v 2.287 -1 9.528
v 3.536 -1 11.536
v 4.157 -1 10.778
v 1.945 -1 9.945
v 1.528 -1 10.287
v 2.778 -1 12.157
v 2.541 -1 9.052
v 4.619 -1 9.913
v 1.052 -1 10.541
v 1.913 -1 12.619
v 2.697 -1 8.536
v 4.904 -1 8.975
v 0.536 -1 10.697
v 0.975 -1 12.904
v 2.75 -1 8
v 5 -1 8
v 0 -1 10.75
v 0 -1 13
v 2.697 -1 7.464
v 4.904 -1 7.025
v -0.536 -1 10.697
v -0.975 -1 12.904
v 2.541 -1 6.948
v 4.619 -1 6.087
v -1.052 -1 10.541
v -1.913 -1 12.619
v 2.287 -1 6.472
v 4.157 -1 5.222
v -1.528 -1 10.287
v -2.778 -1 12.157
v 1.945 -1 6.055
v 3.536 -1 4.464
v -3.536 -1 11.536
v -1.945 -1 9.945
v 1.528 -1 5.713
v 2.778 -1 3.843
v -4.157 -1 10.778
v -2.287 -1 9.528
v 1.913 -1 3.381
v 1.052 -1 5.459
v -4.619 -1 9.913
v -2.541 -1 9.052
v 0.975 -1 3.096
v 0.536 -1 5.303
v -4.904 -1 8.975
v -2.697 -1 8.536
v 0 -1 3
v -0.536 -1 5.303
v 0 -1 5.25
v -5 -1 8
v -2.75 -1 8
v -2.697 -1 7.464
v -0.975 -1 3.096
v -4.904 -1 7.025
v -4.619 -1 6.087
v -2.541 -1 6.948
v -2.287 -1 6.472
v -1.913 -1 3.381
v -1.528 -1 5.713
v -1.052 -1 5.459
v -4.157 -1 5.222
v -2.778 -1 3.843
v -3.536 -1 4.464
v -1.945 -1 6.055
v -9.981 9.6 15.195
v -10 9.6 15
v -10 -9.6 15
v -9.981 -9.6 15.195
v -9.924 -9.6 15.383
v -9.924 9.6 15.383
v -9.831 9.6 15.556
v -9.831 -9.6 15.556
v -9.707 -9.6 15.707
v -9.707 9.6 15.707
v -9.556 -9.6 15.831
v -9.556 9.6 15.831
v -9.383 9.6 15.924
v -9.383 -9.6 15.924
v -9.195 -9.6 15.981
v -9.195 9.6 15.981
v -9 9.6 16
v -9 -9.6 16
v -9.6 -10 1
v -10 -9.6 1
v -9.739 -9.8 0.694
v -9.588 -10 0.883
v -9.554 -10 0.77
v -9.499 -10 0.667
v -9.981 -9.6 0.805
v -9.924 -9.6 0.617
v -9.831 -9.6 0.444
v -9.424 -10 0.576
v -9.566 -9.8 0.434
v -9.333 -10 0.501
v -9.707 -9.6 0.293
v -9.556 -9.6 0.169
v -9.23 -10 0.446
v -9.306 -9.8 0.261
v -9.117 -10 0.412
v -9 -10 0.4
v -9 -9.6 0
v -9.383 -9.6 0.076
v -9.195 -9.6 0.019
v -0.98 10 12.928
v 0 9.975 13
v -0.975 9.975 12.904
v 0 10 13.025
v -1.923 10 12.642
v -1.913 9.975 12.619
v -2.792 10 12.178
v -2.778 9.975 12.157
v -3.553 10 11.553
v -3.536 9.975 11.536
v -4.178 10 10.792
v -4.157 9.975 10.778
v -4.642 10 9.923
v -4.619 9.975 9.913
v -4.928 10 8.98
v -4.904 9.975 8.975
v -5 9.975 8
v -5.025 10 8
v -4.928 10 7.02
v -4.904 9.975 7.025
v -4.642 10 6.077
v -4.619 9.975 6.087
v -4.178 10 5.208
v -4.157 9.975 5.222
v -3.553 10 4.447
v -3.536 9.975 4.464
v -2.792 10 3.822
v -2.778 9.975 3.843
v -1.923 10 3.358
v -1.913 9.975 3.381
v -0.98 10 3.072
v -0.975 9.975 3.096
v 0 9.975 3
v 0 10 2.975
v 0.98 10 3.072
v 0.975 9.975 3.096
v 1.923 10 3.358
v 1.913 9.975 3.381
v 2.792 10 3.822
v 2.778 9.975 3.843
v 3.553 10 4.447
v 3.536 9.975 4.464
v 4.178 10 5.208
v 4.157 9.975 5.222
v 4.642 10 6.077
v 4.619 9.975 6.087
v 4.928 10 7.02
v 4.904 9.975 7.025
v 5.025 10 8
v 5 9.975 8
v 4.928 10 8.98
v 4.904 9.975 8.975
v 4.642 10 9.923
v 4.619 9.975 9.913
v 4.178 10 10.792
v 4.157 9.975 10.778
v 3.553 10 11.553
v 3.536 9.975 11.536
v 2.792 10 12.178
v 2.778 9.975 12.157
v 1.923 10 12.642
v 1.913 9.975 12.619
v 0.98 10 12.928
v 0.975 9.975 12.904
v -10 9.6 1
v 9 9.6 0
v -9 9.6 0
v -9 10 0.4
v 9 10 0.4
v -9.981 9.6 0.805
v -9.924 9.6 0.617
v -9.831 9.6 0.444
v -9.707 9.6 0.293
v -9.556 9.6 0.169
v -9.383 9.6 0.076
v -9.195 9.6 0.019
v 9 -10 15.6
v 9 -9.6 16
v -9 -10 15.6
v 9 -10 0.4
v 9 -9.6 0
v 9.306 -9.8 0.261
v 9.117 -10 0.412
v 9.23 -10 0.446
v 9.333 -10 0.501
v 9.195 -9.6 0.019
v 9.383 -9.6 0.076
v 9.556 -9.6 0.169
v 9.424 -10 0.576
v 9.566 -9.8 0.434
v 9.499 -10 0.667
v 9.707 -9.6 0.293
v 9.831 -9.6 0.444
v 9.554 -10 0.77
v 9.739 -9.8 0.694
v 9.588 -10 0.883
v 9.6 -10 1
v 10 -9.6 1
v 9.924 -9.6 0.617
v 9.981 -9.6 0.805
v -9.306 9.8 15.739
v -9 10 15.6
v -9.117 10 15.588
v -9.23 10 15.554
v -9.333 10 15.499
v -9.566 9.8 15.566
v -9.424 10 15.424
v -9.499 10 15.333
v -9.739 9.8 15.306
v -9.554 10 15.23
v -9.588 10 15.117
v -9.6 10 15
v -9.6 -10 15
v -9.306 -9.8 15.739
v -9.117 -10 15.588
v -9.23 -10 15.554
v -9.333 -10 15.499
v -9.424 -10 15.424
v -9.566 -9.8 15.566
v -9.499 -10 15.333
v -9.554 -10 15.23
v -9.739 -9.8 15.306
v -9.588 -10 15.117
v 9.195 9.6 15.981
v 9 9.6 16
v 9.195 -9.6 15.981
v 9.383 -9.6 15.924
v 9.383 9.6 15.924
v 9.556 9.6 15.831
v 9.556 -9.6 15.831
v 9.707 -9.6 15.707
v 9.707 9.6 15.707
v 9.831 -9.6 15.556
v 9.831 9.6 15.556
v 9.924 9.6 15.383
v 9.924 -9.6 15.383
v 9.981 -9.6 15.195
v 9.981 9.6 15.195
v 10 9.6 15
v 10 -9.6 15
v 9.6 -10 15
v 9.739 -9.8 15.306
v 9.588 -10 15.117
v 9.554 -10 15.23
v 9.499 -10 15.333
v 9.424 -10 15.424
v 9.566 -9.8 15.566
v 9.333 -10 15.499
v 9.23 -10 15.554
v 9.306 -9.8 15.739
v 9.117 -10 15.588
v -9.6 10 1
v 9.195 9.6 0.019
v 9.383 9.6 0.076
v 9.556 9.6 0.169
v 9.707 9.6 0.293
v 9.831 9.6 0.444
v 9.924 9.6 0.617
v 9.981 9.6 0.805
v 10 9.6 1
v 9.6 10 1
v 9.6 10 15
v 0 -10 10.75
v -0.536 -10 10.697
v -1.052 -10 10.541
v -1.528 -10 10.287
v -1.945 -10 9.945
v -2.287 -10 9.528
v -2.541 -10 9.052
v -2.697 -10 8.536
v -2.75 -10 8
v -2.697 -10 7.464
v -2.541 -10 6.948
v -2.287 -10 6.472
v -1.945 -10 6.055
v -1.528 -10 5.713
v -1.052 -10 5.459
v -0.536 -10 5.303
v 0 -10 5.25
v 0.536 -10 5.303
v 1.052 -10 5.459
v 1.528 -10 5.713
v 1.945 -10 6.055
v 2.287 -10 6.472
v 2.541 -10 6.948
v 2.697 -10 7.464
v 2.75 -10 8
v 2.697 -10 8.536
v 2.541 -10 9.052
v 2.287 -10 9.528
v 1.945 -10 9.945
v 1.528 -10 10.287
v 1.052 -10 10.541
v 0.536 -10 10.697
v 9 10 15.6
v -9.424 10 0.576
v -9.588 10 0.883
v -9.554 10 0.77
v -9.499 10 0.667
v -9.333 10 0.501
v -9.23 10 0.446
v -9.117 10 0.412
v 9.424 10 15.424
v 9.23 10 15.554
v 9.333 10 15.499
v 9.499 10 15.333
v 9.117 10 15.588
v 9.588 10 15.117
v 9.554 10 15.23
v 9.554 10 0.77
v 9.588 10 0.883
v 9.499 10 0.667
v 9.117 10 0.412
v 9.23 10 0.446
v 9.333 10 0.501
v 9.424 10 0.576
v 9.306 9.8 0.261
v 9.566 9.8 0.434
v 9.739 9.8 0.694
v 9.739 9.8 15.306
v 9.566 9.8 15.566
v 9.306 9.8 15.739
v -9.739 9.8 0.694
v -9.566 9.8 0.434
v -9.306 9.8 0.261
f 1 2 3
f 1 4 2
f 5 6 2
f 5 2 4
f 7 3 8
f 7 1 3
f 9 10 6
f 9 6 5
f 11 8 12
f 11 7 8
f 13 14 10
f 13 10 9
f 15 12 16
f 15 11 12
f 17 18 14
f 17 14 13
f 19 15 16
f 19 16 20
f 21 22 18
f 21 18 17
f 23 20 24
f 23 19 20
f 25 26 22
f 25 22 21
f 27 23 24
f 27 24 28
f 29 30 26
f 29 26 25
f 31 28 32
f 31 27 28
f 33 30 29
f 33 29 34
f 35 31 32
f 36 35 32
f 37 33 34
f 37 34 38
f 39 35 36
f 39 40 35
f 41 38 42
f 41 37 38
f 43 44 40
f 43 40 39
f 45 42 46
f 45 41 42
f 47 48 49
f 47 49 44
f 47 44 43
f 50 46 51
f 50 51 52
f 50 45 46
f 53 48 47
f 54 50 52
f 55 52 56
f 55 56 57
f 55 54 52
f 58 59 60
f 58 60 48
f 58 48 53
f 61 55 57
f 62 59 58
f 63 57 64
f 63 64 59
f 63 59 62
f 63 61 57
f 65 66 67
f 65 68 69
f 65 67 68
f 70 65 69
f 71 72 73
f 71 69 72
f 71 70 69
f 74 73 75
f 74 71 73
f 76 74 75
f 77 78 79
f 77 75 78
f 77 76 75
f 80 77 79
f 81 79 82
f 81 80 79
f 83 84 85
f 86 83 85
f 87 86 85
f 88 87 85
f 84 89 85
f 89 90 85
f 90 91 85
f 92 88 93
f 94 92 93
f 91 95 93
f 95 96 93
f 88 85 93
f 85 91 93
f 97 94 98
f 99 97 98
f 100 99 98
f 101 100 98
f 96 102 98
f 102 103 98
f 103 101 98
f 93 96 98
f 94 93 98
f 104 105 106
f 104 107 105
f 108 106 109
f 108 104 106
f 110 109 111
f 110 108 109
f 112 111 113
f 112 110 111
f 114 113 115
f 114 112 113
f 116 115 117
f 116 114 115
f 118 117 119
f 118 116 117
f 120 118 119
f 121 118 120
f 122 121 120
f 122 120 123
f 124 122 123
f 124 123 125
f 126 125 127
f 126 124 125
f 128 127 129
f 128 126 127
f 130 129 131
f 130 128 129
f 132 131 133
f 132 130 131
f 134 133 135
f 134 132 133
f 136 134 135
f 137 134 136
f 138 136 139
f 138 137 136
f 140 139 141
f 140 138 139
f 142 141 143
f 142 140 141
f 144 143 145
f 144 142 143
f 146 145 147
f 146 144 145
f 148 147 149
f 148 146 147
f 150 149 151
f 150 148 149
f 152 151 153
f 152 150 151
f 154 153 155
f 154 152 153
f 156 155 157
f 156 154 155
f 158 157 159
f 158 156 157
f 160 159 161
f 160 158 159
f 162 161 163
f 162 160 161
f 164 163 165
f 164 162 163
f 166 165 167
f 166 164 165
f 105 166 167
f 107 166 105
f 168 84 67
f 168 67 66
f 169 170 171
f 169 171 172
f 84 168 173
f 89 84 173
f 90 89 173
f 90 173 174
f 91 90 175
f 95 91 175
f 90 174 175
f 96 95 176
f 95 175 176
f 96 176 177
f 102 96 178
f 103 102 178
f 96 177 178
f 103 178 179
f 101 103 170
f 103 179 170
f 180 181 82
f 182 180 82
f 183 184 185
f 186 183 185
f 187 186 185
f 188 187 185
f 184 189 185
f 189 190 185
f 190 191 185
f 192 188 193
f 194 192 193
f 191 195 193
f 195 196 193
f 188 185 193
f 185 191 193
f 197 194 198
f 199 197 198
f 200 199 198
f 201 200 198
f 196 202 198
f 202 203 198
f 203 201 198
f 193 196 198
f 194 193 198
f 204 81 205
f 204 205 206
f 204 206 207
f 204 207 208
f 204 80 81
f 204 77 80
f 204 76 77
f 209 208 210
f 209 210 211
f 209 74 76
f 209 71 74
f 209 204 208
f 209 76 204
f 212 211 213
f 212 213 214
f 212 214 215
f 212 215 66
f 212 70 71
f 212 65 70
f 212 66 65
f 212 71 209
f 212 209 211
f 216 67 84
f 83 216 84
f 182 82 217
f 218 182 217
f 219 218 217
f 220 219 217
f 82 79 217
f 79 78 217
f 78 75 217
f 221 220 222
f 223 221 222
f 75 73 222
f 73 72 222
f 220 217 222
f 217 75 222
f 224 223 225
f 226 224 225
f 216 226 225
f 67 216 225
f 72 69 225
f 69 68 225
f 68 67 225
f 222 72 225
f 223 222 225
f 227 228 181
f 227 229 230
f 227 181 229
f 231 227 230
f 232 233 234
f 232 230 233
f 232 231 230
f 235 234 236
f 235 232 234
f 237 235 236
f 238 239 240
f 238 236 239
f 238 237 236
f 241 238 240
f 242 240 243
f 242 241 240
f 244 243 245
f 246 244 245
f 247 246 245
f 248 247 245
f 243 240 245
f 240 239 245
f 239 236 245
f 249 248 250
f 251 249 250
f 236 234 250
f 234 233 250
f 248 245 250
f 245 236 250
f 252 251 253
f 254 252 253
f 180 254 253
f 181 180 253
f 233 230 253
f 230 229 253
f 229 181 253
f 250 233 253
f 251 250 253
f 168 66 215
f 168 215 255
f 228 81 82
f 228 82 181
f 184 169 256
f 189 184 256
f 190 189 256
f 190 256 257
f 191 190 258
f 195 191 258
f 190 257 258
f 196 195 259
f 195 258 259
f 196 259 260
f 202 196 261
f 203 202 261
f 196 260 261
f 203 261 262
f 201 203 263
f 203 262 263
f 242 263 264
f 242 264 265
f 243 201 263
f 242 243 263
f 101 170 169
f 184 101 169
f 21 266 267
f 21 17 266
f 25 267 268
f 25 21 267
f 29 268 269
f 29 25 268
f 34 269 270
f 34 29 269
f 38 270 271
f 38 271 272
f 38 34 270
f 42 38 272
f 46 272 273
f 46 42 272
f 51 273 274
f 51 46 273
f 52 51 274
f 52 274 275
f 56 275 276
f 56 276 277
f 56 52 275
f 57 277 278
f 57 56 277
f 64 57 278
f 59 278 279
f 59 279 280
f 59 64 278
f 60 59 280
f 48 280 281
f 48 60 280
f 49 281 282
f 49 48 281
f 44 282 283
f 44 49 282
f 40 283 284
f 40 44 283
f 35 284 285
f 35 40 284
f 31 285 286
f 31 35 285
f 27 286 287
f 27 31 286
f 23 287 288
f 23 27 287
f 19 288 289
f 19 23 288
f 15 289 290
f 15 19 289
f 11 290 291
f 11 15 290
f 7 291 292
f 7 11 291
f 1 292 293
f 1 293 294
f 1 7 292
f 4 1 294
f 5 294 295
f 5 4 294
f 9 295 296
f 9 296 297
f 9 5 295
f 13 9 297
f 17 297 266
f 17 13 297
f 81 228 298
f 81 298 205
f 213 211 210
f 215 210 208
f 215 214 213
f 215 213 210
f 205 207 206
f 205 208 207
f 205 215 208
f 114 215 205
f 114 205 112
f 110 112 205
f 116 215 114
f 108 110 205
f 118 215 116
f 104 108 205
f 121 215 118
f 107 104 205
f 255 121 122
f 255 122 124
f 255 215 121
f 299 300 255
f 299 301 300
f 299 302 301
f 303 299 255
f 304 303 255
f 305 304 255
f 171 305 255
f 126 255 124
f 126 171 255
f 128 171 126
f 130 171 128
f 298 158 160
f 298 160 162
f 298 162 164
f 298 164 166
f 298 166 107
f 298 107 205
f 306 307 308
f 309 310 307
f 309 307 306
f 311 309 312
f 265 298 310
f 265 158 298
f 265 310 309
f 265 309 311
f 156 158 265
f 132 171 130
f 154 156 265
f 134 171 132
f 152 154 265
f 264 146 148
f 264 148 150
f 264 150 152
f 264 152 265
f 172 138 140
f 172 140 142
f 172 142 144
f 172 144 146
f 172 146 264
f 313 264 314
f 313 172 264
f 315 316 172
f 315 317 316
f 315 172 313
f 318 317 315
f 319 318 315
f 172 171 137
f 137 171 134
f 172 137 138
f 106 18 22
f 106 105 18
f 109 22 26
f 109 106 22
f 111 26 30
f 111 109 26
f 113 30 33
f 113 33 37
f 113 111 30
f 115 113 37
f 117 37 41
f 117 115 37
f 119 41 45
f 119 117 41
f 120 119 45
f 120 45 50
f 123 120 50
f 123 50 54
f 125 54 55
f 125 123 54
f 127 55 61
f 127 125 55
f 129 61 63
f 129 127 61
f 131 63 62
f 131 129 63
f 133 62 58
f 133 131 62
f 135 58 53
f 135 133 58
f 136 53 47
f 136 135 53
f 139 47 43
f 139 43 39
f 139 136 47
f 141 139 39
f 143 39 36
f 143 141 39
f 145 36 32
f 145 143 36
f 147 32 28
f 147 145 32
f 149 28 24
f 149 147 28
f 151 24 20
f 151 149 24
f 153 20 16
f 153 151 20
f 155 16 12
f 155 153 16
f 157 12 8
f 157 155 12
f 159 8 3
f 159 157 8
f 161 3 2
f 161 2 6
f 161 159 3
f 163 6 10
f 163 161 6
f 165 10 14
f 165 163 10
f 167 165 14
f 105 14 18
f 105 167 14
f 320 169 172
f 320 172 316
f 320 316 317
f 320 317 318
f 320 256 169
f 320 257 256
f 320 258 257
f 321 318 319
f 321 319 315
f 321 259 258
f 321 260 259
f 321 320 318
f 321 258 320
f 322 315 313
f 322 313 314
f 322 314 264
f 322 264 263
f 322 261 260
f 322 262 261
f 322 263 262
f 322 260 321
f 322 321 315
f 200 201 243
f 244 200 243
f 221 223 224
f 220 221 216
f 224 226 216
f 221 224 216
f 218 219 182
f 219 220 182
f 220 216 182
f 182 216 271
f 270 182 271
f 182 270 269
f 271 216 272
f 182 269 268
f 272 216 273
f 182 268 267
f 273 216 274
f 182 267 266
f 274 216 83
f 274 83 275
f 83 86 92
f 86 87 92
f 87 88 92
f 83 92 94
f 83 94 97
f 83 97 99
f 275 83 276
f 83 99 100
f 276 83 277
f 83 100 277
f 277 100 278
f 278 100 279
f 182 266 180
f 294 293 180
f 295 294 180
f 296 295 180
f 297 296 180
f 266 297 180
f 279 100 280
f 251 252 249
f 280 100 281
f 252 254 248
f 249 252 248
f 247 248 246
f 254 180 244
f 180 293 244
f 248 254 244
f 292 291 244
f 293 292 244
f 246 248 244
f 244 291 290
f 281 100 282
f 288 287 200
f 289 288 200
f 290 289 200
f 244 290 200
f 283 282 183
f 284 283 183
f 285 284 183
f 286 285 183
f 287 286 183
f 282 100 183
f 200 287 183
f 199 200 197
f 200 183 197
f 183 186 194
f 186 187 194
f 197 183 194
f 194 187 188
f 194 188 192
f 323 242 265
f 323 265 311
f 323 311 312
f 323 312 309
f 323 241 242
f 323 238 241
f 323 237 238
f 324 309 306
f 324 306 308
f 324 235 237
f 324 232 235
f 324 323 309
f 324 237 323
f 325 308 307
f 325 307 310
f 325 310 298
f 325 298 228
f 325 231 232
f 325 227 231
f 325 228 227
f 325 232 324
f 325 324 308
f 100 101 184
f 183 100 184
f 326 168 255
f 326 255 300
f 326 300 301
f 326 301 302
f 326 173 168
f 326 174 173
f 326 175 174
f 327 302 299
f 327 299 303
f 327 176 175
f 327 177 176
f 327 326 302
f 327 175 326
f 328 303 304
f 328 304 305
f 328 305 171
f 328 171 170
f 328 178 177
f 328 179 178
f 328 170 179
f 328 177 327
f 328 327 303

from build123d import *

# Parameters (mm, degrees)
SKETCH1_W           = 20
SKETCH1_H           = 20
BOSS_EXTRUDE1_DEPTH = 16
FILLET1_R           = 1
CHAMFER1_SIZE       = 0.4


with BuildPart() as part:
    # Sketch1 → Boss-Extrude1 (new body)
    with BuildSketch(Plane.XY):
        Rectangle(SKETCH1_W, SKETCH1_H)
    extrude(amount=BOSS_EXTRUDE1_DEPTH)

    # Sketch4 → CBORE for M5 Hex Socket Head Cap Screw1 (revolve, cut)
    with BuildSketch(Plane(origin=(0, 10, 8), x_dir=(0, 0, 1), z_dir=(1, 0, 0))):
        Polygon((0, 0), (0, 20), (2.75, 20), (2.75, 11), (5, 11), (5, 0.025), (5.025, 0), align=None)
    revolve(axis=Axis((0, 16.35, 8), (0, -1, 0)), mode=Mode.SUBTRACT)

    # Fillet1
    fillet1_edges = [part.edges().sort_by_distance(p)[0] for p in [
        (10, 0, 16),
        (-10, 0, 16),
        (10, 0, 0),
        (-10, 0, 0),
    ]]
    fillet(fillet1_edges, radius=FILLET1_R)

    # Chamfer1
    chamfer1_edges = [part.edges().sort_by_distance(p)[0] for p in [
        (10, 10, 8),
        (10, -10, 8),
        (0, 10, 0),
        (-10, 10, 8),
        (0, 10, 16),
        (-9.707106781, 10, 15.707106781),
        (-9.707106781, 10, 0.292893219),
        (9.707106781, 10, 15.707106781),
        (9.707106781, 10, 0.292893219),
        (0, -10, 0),
        (0, -10, 16),
        (-10, -10, 8),
        (-9.707106781, -10, 15.707106781),
        (-9.707106781, -10, 0.292893219),
        (9.707106781, -10, 15.707106781),
        (9.707106781, -10, 0.292893219),
    ]]
    chamfer(chamfer1_edges, length=CHAMFER1_SIZE)


solid = part.part
